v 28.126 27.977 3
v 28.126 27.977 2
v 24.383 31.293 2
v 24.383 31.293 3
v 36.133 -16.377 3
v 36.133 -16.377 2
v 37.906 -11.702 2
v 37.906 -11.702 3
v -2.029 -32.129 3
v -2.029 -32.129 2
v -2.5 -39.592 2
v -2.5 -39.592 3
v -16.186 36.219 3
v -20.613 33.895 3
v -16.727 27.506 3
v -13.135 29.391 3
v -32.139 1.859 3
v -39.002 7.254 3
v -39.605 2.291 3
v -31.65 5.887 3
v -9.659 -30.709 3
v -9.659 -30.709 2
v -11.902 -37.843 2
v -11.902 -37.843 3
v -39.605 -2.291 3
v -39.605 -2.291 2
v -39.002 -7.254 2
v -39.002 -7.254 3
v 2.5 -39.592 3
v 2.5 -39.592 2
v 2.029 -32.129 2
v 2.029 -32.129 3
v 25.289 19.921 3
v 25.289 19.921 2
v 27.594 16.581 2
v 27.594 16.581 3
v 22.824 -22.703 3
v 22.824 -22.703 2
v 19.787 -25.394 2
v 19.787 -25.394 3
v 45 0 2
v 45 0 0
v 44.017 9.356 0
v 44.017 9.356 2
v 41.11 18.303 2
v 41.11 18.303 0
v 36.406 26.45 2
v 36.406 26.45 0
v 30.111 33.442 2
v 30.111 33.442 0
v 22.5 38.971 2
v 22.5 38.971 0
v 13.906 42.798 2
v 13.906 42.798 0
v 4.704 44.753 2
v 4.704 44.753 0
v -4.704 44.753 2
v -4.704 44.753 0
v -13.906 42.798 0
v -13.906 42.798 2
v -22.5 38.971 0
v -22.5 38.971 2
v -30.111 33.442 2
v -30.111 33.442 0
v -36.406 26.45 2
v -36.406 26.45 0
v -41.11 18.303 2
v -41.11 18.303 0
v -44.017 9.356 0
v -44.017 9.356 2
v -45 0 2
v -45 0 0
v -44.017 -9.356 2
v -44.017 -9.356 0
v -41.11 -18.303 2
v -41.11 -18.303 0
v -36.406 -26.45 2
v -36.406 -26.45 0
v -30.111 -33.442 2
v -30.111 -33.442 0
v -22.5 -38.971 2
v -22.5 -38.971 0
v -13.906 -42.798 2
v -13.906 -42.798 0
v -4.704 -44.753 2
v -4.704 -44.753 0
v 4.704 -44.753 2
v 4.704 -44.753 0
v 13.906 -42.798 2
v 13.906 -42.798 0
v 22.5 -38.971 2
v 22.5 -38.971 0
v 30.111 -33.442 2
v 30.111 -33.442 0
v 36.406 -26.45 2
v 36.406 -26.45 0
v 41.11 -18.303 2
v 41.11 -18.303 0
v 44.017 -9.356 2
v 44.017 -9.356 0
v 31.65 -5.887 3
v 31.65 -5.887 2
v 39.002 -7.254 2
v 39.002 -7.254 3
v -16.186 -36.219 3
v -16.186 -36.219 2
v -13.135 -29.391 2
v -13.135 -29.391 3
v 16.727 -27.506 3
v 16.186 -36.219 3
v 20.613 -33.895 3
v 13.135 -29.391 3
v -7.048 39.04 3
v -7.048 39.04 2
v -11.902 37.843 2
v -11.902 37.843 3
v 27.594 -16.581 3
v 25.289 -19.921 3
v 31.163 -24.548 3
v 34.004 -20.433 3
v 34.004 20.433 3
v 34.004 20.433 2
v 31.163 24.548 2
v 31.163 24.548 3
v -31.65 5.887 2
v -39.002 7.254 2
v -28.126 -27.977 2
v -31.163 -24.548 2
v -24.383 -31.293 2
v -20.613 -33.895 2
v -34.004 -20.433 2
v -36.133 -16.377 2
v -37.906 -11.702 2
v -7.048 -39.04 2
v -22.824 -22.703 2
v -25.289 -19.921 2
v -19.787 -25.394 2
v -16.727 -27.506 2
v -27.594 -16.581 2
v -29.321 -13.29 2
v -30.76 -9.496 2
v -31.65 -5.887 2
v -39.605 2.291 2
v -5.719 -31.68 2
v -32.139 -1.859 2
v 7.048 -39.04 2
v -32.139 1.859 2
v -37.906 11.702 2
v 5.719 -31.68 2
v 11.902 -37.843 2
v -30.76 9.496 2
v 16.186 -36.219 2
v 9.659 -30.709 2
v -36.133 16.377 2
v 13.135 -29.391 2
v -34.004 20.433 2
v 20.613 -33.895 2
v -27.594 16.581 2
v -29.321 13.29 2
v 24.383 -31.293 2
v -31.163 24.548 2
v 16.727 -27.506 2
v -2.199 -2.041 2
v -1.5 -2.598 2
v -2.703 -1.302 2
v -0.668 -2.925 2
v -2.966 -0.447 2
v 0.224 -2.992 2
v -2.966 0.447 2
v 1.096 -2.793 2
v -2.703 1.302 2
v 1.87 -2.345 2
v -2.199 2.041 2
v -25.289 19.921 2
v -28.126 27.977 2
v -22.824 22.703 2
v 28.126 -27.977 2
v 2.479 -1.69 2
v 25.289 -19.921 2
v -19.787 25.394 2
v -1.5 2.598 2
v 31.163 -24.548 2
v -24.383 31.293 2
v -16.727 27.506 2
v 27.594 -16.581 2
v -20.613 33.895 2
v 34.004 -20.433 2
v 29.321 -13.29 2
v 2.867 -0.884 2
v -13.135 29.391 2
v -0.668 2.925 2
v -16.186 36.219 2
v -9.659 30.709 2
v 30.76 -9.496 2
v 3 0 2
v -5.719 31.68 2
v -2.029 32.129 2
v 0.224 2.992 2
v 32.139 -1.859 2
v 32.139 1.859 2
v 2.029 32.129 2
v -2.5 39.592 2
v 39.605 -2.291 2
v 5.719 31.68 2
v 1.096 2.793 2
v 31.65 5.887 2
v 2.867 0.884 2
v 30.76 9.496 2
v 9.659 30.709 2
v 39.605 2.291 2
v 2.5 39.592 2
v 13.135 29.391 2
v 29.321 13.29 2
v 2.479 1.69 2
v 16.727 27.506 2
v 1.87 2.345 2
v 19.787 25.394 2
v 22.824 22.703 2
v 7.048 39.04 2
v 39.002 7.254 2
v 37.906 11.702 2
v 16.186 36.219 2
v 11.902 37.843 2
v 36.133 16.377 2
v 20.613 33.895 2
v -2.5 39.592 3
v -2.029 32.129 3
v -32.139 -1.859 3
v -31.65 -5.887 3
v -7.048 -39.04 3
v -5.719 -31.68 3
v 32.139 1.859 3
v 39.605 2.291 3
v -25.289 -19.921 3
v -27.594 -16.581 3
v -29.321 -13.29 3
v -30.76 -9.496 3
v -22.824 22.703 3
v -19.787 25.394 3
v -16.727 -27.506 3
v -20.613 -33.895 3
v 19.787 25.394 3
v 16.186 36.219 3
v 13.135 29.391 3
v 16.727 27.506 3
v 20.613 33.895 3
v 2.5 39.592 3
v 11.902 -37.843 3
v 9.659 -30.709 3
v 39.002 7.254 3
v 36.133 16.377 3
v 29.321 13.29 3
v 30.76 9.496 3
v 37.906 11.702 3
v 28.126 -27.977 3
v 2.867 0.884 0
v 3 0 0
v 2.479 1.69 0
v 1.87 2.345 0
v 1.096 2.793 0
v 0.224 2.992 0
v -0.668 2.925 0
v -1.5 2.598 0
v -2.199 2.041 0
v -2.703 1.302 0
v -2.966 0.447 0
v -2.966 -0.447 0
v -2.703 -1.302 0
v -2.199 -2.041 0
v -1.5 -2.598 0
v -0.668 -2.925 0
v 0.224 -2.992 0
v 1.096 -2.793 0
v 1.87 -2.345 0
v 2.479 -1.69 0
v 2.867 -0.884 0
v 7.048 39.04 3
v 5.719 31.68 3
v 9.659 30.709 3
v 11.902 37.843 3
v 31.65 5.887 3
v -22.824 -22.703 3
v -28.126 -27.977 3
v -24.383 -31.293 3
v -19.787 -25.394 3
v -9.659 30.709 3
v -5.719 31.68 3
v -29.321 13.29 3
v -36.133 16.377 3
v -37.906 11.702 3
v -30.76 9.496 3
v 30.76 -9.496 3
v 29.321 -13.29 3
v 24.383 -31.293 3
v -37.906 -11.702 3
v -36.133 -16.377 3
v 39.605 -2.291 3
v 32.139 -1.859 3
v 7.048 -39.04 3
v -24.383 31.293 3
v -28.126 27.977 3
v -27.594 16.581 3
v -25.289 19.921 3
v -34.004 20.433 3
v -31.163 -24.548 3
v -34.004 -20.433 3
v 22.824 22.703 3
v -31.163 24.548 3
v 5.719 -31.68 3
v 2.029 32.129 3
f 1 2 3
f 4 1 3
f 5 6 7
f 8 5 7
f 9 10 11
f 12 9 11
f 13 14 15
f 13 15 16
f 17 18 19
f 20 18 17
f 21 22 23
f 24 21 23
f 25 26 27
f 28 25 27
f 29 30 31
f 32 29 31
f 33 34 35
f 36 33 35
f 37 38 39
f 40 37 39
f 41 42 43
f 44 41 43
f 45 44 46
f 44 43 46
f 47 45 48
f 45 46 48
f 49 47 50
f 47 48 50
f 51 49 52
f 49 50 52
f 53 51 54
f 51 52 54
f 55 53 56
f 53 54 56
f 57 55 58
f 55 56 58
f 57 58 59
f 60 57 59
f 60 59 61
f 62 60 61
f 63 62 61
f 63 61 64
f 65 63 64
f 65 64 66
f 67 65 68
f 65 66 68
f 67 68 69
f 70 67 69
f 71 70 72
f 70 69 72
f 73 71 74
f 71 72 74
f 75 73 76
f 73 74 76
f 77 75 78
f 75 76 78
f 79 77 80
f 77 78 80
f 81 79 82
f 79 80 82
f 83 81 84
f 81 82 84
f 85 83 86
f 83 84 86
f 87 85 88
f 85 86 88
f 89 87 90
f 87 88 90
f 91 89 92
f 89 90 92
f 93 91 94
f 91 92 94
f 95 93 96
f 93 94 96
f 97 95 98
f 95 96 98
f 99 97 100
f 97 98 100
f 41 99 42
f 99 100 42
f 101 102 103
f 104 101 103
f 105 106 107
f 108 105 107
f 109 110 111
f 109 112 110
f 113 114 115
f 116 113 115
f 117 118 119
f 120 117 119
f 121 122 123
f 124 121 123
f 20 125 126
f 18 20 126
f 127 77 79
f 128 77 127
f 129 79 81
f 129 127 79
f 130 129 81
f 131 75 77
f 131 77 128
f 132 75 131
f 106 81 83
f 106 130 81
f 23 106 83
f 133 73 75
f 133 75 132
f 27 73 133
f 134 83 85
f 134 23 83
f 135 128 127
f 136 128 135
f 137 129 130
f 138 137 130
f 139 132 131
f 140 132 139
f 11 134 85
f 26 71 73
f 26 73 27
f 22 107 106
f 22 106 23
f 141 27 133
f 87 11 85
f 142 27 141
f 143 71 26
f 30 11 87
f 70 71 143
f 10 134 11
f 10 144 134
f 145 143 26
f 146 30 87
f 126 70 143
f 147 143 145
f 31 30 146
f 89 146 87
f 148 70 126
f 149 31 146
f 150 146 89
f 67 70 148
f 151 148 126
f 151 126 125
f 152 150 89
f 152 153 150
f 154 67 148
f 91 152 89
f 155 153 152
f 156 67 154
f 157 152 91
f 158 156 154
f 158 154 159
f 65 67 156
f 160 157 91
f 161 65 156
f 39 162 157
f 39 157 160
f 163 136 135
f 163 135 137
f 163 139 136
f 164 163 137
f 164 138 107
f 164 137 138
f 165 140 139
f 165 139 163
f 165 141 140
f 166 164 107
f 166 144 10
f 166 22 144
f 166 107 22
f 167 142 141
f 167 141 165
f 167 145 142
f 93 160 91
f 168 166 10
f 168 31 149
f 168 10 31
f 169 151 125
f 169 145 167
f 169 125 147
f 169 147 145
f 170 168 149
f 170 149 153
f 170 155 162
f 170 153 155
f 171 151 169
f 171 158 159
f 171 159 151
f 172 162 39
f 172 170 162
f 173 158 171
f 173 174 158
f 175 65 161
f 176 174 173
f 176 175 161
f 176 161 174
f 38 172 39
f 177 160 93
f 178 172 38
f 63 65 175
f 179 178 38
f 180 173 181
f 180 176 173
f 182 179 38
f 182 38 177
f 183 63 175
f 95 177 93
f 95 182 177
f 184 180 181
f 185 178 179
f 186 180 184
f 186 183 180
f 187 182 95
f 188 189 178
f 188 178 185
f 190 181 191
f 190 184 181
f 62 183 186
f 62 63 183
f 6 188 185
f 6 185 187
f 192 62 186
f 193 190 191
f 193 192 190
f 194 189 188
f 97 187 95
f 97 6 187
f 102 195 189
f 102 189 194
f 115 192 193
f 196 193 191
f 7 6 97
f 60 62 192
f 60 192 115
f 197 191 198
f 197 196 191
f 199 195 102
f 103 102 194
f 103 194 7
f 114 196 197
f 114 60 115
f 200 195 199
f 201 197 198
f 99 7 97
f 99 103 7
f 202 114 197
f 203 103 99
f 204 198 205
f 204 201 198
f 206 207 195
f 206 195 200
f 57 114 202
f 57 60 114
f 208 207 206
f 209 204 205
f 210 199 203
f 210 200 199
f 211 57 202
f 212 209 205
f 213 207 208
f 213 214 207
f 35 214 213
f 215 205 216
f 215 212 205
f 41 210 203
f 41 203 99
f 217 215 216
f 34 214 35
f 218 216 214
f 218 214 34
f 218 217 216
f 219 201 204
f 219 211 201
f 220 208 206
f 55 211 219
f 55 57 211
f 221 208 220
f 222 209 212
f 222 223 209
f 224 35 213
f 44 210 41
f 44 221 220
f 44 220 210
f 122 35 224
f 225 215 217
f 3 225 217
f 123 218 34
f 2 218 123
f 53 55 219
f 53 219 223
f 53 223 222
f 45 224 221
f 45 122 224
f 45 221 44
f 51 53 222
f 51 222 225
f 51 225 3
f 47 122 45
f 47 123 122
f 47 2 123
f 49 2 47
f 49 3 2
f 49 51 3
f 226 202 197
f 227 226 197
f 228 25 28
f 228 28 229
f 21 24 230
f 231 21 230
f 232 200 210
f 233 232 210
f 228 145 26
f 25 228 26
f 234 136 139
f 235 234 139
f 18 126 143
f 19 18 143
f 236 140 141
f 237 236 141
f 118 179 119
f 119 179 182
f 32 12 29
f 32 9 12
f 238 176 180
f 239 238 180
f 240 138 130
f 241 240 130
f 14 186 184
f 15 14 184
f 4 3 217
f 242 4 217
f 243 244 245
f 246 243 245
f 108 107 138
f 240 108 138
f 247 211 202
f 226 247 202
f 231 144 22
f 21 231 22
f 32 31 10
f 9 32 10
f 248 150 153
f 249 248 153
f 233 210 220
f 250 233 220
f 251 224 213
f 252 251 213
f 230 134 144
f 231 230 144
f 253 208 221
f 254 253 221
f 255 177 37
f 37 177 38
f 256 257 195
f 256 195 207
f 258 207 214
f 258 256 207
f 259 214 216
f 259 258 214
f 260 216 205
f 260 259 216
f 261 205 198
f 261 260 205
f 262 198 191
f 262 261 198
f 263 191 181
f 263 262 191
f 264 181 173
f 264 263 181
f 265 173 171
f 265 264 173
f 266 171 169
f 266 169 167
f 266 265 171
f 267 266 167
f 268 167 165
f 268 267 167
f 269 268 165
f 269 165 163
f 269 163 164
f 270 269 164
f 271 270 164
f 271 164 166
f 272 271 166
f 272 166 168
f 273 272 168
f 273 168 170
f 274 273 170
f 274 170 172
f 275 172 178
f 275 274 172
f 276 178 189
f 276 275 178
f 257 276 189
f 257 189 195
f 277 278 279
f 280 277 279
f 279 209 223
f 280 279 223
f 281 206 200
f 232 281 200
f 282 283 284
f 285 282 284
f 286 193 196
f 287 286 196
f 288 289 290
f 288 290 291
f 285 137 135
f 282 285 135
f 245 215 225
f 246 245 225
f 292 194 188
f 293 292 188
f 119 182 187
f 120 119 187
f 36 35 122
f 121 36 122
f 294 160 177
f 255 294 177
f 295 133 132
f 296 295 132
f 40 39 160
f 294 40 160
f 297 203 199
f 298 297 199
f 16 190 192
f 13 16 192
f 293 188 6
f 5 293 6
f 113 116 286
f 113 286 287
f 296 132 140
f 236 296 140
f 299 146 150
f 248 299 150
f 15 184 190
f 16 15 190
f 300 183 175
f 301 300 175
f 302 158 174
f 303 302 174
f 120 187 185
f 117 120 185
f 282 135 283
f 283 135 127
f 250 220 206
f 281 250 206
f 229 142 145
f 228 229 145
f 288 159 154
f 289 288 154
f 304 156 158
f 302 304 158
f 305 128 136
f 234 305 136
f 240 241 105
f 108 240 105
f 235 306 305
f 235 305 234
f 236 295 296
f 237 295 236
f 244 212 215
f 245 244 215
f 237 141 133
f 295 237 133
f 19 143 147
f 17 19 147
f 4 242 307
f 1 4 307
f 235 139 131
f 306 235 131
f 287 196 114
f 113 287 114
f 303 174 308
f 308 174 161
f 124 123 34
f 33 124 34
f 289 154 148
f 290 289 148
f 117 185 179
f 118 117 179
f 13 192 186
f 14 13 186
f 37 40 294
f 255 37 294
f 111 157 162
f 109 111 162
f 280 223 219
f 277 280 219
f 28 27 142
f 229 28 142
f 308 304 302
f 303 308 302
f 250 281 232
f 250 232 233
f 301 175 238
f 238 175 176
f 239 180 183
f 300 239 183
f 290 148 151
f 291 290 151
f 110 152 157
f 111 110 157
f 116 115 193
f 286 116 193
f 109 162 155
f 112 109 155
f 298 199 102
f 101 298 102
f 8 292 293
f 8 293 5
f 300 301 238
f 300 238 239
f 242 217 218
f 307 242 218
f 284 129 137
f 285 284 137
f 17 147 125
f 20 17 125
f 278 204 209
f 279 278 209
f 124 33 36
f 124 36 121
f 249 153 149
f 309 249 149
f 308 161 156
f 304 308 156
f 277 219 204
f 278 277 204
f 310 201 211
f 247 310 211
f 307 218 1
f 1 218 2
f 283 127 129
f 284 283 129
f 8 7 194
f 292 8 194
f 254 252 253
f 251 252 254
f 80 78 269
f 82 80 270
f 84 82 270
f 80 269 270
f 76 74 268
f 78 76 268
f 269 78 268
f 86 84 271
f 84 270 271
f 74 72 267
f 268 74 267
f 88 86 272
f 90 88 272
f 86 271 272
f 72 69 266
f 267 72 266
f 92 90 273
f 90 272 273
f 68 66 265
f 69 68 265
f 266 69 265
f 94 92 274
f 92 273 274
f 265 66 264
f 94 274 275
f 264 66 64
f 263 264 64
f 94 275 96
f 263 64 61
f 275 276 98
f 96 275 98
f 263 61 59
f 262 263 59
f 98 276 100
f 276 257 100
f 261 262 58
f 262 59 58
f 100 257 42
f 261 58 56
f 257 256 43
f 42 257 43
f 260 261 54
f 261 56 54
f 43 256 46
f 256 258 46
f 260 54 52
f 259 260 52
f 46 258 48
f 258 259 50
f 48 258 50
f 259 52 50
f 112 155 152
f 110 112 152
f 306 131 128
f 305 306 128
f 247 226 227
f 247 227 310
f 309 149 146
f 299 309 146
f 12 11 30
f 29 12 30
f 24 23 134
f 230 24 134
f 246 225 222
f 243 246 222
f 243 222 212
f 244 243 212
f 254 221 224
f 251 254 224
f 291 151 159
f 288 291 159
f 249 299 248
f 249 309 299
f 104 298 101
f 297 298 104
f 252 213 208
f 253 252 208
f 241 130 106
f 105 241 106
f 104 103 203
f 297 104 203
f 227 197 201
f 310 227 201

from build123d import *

# Parameters (mm, degrees)
SKETCH1_R           = 45
SKETCH1_R_2         = 3
BOSS_EXTRUDE1_DEPTH = 2
BOSS_EXTRUDE2_DEPTH = 1


with BuildPart() as part:
    # Sketch1 → Boss-Extrude1 (new body)
    with BuildSketch(Plane.XY):
        Circle(SKETCH1_R)
        Circle(SKETCH1_R_2, mode=Mode.SUBTRACT)
    extrude(amount=BOSS_EXTRUDE1_DEPTH)

    # Sketch2 → Boss-Extrude2 (add)
    with BuildSketch(Plane.XY.offset(2)):
        Polygon((2.5, 39.592009569), (-2.5, 39.592009569), (-2.028723843, 32.128501517), (2.028723843, 32.128501517), align=None)
        Polygon((11.902342614, 37.843248566), (7.047633527, 39.039826887), (5.719080868, 31.680411048), (9.658626498, 30.70940026), align=None)
        Polygon((20.612964339, 33.895175511), (16.18568421, 36.218791371), (13.134513387, 29.391170243), (16.727204889, 27.505580284), align=None)
        Polygon((28.125635501, 27.977238059), (24.38308176, 31.29285135), (19.78661573, 25.393821456), (22.823658933, 22.703235961), align=None)
        Polygon((34.003746961, 20.433365224), (31.163423227, 24.548284553), (25.288791888, 19.920676068), (27.59368488, 16.581462086), align=None)
        Polygon((37.905684245, 11.701979474), (36.13265981, 16.377060688), (29.321275383, 13.289813396), (30.760066161, 9.496033907), align=None)
        Polygon((39.604680943, 2.290517213), (39.001997542, 7.254061583), (31.64971293, 5.886595076), (32.138784205, 1.858730753), align=None)
        Polygon((39.001997542, -7.254061583), (39.604680943, -2.290517213), (32.138784205, -1.858730753), (31.64971293, -5.886595076), align=None)
        Polygon((36.13265981, -16.377060688), (37.905684245, -11.701979474), (30.760066161, -9.496033907), (29.321275383, -13.289813396), align=None)
        Polygon((31.163423227, -24.548284553), (34.003746961, -20.433365224), (27.59368488, -16.581462086), (25.288791888, -19.920676068), align=None)
        Polygon((24.38308176, -31.29285135), (28.125635501, -27.977238059), (22.823658933, -22.703235961), (19.78661573, -25.393821456), align=None)
        Polygon((16.18568421, -36.218791371), (20.612964339, -33.895175511), (16.727204889, -27.505580284), (13.134513387, -29.391170243), align=None)
        Polygon((7.047633527, -39.039826887), (11.902342614, -37.843248566), (9.658626498, -30.70940026), (5.719080868, -31.680411048), align=None)
        Polygon((-2.5, -39.592009569), (2.5, -39.592009569), (2.028723843, -32.128501517), (-2.028723843, -32.128501517), align=None)
        Polygon((-11.902342614, -37.843248566), (-7.047633527, -39.039826887), (-5.719080868, -31.680411048), (-9.658626498, -30.70940026), align=None)
        Polygon((-20.612964339, -33.895175511), (-16.18568421, -36.218791371), (-13.134513387, -29.391170243), (-16.727204889, -27.505580284), align=None)
        Polygon((-28.125635501, -27.977238059), (-24.38308176, -31.29285135), (-19.78661573, -25.393821456), (-22.823658933, -22.703235961), align=None)
        Polygon((-34.003746961, -20.433365224), (-31.163423227, -24.548284553), (-25.288791888, -19.920676068), (-27.59368488, -16.581462086), align=None)
        Polygon((-37.905684245, -11.701979474), (-36.13265981, -16.377060688), (-29.321275383, -13.289813396), (-30.760066161, -9.496033907), align=None)
        Polygon((-39.604680943, -2.290517213), (-39.001997542, -7.254061583), (-31.64971293, -5.886595076), (-32.138784205, -1.858730753), align=None)
        Polygon((-39.001997542, 7.254061583), (-39.604680943, 2.290517213), (-32.138784205, 1.858730753), (-31.64971293, 5.886595076), align=None)
        Polygon((-36.13265981, 16.377060688), (-37.905684245, 11.701979474), (-30.760066161, 9.496033907), (-29.321275383, 13.289813396), align=None)
        Polygon((-31.163423227, 24.548284553), (-34.003746961, 20.433365224), (-27.59368488, 16.581462086), (-25.288791888, 19.920676068), align=None)
        Polygon((-24.38308176, 31.29285135), (-28.125635501, 27.977238059), (-22.823658933, 22.703235961), (-19.78661573, 25.393821456), align=None)
        Polygon((-16.18568421, 36.218791371), (-20.612964339, 33.895175511), (-16.727204889, 27.505580284), (-13.134513387, 29.391170243), align=None)
        Polygon((-7.047633527, 39.039826887), (-11.902342614, 37.843248566), (-9.658626498, 30.70940026), (-5.719080868, 31.680411048), align=None)
    extrude(amount=BOSS_EXTRUDE2_DEPTH)


solid = part.part
